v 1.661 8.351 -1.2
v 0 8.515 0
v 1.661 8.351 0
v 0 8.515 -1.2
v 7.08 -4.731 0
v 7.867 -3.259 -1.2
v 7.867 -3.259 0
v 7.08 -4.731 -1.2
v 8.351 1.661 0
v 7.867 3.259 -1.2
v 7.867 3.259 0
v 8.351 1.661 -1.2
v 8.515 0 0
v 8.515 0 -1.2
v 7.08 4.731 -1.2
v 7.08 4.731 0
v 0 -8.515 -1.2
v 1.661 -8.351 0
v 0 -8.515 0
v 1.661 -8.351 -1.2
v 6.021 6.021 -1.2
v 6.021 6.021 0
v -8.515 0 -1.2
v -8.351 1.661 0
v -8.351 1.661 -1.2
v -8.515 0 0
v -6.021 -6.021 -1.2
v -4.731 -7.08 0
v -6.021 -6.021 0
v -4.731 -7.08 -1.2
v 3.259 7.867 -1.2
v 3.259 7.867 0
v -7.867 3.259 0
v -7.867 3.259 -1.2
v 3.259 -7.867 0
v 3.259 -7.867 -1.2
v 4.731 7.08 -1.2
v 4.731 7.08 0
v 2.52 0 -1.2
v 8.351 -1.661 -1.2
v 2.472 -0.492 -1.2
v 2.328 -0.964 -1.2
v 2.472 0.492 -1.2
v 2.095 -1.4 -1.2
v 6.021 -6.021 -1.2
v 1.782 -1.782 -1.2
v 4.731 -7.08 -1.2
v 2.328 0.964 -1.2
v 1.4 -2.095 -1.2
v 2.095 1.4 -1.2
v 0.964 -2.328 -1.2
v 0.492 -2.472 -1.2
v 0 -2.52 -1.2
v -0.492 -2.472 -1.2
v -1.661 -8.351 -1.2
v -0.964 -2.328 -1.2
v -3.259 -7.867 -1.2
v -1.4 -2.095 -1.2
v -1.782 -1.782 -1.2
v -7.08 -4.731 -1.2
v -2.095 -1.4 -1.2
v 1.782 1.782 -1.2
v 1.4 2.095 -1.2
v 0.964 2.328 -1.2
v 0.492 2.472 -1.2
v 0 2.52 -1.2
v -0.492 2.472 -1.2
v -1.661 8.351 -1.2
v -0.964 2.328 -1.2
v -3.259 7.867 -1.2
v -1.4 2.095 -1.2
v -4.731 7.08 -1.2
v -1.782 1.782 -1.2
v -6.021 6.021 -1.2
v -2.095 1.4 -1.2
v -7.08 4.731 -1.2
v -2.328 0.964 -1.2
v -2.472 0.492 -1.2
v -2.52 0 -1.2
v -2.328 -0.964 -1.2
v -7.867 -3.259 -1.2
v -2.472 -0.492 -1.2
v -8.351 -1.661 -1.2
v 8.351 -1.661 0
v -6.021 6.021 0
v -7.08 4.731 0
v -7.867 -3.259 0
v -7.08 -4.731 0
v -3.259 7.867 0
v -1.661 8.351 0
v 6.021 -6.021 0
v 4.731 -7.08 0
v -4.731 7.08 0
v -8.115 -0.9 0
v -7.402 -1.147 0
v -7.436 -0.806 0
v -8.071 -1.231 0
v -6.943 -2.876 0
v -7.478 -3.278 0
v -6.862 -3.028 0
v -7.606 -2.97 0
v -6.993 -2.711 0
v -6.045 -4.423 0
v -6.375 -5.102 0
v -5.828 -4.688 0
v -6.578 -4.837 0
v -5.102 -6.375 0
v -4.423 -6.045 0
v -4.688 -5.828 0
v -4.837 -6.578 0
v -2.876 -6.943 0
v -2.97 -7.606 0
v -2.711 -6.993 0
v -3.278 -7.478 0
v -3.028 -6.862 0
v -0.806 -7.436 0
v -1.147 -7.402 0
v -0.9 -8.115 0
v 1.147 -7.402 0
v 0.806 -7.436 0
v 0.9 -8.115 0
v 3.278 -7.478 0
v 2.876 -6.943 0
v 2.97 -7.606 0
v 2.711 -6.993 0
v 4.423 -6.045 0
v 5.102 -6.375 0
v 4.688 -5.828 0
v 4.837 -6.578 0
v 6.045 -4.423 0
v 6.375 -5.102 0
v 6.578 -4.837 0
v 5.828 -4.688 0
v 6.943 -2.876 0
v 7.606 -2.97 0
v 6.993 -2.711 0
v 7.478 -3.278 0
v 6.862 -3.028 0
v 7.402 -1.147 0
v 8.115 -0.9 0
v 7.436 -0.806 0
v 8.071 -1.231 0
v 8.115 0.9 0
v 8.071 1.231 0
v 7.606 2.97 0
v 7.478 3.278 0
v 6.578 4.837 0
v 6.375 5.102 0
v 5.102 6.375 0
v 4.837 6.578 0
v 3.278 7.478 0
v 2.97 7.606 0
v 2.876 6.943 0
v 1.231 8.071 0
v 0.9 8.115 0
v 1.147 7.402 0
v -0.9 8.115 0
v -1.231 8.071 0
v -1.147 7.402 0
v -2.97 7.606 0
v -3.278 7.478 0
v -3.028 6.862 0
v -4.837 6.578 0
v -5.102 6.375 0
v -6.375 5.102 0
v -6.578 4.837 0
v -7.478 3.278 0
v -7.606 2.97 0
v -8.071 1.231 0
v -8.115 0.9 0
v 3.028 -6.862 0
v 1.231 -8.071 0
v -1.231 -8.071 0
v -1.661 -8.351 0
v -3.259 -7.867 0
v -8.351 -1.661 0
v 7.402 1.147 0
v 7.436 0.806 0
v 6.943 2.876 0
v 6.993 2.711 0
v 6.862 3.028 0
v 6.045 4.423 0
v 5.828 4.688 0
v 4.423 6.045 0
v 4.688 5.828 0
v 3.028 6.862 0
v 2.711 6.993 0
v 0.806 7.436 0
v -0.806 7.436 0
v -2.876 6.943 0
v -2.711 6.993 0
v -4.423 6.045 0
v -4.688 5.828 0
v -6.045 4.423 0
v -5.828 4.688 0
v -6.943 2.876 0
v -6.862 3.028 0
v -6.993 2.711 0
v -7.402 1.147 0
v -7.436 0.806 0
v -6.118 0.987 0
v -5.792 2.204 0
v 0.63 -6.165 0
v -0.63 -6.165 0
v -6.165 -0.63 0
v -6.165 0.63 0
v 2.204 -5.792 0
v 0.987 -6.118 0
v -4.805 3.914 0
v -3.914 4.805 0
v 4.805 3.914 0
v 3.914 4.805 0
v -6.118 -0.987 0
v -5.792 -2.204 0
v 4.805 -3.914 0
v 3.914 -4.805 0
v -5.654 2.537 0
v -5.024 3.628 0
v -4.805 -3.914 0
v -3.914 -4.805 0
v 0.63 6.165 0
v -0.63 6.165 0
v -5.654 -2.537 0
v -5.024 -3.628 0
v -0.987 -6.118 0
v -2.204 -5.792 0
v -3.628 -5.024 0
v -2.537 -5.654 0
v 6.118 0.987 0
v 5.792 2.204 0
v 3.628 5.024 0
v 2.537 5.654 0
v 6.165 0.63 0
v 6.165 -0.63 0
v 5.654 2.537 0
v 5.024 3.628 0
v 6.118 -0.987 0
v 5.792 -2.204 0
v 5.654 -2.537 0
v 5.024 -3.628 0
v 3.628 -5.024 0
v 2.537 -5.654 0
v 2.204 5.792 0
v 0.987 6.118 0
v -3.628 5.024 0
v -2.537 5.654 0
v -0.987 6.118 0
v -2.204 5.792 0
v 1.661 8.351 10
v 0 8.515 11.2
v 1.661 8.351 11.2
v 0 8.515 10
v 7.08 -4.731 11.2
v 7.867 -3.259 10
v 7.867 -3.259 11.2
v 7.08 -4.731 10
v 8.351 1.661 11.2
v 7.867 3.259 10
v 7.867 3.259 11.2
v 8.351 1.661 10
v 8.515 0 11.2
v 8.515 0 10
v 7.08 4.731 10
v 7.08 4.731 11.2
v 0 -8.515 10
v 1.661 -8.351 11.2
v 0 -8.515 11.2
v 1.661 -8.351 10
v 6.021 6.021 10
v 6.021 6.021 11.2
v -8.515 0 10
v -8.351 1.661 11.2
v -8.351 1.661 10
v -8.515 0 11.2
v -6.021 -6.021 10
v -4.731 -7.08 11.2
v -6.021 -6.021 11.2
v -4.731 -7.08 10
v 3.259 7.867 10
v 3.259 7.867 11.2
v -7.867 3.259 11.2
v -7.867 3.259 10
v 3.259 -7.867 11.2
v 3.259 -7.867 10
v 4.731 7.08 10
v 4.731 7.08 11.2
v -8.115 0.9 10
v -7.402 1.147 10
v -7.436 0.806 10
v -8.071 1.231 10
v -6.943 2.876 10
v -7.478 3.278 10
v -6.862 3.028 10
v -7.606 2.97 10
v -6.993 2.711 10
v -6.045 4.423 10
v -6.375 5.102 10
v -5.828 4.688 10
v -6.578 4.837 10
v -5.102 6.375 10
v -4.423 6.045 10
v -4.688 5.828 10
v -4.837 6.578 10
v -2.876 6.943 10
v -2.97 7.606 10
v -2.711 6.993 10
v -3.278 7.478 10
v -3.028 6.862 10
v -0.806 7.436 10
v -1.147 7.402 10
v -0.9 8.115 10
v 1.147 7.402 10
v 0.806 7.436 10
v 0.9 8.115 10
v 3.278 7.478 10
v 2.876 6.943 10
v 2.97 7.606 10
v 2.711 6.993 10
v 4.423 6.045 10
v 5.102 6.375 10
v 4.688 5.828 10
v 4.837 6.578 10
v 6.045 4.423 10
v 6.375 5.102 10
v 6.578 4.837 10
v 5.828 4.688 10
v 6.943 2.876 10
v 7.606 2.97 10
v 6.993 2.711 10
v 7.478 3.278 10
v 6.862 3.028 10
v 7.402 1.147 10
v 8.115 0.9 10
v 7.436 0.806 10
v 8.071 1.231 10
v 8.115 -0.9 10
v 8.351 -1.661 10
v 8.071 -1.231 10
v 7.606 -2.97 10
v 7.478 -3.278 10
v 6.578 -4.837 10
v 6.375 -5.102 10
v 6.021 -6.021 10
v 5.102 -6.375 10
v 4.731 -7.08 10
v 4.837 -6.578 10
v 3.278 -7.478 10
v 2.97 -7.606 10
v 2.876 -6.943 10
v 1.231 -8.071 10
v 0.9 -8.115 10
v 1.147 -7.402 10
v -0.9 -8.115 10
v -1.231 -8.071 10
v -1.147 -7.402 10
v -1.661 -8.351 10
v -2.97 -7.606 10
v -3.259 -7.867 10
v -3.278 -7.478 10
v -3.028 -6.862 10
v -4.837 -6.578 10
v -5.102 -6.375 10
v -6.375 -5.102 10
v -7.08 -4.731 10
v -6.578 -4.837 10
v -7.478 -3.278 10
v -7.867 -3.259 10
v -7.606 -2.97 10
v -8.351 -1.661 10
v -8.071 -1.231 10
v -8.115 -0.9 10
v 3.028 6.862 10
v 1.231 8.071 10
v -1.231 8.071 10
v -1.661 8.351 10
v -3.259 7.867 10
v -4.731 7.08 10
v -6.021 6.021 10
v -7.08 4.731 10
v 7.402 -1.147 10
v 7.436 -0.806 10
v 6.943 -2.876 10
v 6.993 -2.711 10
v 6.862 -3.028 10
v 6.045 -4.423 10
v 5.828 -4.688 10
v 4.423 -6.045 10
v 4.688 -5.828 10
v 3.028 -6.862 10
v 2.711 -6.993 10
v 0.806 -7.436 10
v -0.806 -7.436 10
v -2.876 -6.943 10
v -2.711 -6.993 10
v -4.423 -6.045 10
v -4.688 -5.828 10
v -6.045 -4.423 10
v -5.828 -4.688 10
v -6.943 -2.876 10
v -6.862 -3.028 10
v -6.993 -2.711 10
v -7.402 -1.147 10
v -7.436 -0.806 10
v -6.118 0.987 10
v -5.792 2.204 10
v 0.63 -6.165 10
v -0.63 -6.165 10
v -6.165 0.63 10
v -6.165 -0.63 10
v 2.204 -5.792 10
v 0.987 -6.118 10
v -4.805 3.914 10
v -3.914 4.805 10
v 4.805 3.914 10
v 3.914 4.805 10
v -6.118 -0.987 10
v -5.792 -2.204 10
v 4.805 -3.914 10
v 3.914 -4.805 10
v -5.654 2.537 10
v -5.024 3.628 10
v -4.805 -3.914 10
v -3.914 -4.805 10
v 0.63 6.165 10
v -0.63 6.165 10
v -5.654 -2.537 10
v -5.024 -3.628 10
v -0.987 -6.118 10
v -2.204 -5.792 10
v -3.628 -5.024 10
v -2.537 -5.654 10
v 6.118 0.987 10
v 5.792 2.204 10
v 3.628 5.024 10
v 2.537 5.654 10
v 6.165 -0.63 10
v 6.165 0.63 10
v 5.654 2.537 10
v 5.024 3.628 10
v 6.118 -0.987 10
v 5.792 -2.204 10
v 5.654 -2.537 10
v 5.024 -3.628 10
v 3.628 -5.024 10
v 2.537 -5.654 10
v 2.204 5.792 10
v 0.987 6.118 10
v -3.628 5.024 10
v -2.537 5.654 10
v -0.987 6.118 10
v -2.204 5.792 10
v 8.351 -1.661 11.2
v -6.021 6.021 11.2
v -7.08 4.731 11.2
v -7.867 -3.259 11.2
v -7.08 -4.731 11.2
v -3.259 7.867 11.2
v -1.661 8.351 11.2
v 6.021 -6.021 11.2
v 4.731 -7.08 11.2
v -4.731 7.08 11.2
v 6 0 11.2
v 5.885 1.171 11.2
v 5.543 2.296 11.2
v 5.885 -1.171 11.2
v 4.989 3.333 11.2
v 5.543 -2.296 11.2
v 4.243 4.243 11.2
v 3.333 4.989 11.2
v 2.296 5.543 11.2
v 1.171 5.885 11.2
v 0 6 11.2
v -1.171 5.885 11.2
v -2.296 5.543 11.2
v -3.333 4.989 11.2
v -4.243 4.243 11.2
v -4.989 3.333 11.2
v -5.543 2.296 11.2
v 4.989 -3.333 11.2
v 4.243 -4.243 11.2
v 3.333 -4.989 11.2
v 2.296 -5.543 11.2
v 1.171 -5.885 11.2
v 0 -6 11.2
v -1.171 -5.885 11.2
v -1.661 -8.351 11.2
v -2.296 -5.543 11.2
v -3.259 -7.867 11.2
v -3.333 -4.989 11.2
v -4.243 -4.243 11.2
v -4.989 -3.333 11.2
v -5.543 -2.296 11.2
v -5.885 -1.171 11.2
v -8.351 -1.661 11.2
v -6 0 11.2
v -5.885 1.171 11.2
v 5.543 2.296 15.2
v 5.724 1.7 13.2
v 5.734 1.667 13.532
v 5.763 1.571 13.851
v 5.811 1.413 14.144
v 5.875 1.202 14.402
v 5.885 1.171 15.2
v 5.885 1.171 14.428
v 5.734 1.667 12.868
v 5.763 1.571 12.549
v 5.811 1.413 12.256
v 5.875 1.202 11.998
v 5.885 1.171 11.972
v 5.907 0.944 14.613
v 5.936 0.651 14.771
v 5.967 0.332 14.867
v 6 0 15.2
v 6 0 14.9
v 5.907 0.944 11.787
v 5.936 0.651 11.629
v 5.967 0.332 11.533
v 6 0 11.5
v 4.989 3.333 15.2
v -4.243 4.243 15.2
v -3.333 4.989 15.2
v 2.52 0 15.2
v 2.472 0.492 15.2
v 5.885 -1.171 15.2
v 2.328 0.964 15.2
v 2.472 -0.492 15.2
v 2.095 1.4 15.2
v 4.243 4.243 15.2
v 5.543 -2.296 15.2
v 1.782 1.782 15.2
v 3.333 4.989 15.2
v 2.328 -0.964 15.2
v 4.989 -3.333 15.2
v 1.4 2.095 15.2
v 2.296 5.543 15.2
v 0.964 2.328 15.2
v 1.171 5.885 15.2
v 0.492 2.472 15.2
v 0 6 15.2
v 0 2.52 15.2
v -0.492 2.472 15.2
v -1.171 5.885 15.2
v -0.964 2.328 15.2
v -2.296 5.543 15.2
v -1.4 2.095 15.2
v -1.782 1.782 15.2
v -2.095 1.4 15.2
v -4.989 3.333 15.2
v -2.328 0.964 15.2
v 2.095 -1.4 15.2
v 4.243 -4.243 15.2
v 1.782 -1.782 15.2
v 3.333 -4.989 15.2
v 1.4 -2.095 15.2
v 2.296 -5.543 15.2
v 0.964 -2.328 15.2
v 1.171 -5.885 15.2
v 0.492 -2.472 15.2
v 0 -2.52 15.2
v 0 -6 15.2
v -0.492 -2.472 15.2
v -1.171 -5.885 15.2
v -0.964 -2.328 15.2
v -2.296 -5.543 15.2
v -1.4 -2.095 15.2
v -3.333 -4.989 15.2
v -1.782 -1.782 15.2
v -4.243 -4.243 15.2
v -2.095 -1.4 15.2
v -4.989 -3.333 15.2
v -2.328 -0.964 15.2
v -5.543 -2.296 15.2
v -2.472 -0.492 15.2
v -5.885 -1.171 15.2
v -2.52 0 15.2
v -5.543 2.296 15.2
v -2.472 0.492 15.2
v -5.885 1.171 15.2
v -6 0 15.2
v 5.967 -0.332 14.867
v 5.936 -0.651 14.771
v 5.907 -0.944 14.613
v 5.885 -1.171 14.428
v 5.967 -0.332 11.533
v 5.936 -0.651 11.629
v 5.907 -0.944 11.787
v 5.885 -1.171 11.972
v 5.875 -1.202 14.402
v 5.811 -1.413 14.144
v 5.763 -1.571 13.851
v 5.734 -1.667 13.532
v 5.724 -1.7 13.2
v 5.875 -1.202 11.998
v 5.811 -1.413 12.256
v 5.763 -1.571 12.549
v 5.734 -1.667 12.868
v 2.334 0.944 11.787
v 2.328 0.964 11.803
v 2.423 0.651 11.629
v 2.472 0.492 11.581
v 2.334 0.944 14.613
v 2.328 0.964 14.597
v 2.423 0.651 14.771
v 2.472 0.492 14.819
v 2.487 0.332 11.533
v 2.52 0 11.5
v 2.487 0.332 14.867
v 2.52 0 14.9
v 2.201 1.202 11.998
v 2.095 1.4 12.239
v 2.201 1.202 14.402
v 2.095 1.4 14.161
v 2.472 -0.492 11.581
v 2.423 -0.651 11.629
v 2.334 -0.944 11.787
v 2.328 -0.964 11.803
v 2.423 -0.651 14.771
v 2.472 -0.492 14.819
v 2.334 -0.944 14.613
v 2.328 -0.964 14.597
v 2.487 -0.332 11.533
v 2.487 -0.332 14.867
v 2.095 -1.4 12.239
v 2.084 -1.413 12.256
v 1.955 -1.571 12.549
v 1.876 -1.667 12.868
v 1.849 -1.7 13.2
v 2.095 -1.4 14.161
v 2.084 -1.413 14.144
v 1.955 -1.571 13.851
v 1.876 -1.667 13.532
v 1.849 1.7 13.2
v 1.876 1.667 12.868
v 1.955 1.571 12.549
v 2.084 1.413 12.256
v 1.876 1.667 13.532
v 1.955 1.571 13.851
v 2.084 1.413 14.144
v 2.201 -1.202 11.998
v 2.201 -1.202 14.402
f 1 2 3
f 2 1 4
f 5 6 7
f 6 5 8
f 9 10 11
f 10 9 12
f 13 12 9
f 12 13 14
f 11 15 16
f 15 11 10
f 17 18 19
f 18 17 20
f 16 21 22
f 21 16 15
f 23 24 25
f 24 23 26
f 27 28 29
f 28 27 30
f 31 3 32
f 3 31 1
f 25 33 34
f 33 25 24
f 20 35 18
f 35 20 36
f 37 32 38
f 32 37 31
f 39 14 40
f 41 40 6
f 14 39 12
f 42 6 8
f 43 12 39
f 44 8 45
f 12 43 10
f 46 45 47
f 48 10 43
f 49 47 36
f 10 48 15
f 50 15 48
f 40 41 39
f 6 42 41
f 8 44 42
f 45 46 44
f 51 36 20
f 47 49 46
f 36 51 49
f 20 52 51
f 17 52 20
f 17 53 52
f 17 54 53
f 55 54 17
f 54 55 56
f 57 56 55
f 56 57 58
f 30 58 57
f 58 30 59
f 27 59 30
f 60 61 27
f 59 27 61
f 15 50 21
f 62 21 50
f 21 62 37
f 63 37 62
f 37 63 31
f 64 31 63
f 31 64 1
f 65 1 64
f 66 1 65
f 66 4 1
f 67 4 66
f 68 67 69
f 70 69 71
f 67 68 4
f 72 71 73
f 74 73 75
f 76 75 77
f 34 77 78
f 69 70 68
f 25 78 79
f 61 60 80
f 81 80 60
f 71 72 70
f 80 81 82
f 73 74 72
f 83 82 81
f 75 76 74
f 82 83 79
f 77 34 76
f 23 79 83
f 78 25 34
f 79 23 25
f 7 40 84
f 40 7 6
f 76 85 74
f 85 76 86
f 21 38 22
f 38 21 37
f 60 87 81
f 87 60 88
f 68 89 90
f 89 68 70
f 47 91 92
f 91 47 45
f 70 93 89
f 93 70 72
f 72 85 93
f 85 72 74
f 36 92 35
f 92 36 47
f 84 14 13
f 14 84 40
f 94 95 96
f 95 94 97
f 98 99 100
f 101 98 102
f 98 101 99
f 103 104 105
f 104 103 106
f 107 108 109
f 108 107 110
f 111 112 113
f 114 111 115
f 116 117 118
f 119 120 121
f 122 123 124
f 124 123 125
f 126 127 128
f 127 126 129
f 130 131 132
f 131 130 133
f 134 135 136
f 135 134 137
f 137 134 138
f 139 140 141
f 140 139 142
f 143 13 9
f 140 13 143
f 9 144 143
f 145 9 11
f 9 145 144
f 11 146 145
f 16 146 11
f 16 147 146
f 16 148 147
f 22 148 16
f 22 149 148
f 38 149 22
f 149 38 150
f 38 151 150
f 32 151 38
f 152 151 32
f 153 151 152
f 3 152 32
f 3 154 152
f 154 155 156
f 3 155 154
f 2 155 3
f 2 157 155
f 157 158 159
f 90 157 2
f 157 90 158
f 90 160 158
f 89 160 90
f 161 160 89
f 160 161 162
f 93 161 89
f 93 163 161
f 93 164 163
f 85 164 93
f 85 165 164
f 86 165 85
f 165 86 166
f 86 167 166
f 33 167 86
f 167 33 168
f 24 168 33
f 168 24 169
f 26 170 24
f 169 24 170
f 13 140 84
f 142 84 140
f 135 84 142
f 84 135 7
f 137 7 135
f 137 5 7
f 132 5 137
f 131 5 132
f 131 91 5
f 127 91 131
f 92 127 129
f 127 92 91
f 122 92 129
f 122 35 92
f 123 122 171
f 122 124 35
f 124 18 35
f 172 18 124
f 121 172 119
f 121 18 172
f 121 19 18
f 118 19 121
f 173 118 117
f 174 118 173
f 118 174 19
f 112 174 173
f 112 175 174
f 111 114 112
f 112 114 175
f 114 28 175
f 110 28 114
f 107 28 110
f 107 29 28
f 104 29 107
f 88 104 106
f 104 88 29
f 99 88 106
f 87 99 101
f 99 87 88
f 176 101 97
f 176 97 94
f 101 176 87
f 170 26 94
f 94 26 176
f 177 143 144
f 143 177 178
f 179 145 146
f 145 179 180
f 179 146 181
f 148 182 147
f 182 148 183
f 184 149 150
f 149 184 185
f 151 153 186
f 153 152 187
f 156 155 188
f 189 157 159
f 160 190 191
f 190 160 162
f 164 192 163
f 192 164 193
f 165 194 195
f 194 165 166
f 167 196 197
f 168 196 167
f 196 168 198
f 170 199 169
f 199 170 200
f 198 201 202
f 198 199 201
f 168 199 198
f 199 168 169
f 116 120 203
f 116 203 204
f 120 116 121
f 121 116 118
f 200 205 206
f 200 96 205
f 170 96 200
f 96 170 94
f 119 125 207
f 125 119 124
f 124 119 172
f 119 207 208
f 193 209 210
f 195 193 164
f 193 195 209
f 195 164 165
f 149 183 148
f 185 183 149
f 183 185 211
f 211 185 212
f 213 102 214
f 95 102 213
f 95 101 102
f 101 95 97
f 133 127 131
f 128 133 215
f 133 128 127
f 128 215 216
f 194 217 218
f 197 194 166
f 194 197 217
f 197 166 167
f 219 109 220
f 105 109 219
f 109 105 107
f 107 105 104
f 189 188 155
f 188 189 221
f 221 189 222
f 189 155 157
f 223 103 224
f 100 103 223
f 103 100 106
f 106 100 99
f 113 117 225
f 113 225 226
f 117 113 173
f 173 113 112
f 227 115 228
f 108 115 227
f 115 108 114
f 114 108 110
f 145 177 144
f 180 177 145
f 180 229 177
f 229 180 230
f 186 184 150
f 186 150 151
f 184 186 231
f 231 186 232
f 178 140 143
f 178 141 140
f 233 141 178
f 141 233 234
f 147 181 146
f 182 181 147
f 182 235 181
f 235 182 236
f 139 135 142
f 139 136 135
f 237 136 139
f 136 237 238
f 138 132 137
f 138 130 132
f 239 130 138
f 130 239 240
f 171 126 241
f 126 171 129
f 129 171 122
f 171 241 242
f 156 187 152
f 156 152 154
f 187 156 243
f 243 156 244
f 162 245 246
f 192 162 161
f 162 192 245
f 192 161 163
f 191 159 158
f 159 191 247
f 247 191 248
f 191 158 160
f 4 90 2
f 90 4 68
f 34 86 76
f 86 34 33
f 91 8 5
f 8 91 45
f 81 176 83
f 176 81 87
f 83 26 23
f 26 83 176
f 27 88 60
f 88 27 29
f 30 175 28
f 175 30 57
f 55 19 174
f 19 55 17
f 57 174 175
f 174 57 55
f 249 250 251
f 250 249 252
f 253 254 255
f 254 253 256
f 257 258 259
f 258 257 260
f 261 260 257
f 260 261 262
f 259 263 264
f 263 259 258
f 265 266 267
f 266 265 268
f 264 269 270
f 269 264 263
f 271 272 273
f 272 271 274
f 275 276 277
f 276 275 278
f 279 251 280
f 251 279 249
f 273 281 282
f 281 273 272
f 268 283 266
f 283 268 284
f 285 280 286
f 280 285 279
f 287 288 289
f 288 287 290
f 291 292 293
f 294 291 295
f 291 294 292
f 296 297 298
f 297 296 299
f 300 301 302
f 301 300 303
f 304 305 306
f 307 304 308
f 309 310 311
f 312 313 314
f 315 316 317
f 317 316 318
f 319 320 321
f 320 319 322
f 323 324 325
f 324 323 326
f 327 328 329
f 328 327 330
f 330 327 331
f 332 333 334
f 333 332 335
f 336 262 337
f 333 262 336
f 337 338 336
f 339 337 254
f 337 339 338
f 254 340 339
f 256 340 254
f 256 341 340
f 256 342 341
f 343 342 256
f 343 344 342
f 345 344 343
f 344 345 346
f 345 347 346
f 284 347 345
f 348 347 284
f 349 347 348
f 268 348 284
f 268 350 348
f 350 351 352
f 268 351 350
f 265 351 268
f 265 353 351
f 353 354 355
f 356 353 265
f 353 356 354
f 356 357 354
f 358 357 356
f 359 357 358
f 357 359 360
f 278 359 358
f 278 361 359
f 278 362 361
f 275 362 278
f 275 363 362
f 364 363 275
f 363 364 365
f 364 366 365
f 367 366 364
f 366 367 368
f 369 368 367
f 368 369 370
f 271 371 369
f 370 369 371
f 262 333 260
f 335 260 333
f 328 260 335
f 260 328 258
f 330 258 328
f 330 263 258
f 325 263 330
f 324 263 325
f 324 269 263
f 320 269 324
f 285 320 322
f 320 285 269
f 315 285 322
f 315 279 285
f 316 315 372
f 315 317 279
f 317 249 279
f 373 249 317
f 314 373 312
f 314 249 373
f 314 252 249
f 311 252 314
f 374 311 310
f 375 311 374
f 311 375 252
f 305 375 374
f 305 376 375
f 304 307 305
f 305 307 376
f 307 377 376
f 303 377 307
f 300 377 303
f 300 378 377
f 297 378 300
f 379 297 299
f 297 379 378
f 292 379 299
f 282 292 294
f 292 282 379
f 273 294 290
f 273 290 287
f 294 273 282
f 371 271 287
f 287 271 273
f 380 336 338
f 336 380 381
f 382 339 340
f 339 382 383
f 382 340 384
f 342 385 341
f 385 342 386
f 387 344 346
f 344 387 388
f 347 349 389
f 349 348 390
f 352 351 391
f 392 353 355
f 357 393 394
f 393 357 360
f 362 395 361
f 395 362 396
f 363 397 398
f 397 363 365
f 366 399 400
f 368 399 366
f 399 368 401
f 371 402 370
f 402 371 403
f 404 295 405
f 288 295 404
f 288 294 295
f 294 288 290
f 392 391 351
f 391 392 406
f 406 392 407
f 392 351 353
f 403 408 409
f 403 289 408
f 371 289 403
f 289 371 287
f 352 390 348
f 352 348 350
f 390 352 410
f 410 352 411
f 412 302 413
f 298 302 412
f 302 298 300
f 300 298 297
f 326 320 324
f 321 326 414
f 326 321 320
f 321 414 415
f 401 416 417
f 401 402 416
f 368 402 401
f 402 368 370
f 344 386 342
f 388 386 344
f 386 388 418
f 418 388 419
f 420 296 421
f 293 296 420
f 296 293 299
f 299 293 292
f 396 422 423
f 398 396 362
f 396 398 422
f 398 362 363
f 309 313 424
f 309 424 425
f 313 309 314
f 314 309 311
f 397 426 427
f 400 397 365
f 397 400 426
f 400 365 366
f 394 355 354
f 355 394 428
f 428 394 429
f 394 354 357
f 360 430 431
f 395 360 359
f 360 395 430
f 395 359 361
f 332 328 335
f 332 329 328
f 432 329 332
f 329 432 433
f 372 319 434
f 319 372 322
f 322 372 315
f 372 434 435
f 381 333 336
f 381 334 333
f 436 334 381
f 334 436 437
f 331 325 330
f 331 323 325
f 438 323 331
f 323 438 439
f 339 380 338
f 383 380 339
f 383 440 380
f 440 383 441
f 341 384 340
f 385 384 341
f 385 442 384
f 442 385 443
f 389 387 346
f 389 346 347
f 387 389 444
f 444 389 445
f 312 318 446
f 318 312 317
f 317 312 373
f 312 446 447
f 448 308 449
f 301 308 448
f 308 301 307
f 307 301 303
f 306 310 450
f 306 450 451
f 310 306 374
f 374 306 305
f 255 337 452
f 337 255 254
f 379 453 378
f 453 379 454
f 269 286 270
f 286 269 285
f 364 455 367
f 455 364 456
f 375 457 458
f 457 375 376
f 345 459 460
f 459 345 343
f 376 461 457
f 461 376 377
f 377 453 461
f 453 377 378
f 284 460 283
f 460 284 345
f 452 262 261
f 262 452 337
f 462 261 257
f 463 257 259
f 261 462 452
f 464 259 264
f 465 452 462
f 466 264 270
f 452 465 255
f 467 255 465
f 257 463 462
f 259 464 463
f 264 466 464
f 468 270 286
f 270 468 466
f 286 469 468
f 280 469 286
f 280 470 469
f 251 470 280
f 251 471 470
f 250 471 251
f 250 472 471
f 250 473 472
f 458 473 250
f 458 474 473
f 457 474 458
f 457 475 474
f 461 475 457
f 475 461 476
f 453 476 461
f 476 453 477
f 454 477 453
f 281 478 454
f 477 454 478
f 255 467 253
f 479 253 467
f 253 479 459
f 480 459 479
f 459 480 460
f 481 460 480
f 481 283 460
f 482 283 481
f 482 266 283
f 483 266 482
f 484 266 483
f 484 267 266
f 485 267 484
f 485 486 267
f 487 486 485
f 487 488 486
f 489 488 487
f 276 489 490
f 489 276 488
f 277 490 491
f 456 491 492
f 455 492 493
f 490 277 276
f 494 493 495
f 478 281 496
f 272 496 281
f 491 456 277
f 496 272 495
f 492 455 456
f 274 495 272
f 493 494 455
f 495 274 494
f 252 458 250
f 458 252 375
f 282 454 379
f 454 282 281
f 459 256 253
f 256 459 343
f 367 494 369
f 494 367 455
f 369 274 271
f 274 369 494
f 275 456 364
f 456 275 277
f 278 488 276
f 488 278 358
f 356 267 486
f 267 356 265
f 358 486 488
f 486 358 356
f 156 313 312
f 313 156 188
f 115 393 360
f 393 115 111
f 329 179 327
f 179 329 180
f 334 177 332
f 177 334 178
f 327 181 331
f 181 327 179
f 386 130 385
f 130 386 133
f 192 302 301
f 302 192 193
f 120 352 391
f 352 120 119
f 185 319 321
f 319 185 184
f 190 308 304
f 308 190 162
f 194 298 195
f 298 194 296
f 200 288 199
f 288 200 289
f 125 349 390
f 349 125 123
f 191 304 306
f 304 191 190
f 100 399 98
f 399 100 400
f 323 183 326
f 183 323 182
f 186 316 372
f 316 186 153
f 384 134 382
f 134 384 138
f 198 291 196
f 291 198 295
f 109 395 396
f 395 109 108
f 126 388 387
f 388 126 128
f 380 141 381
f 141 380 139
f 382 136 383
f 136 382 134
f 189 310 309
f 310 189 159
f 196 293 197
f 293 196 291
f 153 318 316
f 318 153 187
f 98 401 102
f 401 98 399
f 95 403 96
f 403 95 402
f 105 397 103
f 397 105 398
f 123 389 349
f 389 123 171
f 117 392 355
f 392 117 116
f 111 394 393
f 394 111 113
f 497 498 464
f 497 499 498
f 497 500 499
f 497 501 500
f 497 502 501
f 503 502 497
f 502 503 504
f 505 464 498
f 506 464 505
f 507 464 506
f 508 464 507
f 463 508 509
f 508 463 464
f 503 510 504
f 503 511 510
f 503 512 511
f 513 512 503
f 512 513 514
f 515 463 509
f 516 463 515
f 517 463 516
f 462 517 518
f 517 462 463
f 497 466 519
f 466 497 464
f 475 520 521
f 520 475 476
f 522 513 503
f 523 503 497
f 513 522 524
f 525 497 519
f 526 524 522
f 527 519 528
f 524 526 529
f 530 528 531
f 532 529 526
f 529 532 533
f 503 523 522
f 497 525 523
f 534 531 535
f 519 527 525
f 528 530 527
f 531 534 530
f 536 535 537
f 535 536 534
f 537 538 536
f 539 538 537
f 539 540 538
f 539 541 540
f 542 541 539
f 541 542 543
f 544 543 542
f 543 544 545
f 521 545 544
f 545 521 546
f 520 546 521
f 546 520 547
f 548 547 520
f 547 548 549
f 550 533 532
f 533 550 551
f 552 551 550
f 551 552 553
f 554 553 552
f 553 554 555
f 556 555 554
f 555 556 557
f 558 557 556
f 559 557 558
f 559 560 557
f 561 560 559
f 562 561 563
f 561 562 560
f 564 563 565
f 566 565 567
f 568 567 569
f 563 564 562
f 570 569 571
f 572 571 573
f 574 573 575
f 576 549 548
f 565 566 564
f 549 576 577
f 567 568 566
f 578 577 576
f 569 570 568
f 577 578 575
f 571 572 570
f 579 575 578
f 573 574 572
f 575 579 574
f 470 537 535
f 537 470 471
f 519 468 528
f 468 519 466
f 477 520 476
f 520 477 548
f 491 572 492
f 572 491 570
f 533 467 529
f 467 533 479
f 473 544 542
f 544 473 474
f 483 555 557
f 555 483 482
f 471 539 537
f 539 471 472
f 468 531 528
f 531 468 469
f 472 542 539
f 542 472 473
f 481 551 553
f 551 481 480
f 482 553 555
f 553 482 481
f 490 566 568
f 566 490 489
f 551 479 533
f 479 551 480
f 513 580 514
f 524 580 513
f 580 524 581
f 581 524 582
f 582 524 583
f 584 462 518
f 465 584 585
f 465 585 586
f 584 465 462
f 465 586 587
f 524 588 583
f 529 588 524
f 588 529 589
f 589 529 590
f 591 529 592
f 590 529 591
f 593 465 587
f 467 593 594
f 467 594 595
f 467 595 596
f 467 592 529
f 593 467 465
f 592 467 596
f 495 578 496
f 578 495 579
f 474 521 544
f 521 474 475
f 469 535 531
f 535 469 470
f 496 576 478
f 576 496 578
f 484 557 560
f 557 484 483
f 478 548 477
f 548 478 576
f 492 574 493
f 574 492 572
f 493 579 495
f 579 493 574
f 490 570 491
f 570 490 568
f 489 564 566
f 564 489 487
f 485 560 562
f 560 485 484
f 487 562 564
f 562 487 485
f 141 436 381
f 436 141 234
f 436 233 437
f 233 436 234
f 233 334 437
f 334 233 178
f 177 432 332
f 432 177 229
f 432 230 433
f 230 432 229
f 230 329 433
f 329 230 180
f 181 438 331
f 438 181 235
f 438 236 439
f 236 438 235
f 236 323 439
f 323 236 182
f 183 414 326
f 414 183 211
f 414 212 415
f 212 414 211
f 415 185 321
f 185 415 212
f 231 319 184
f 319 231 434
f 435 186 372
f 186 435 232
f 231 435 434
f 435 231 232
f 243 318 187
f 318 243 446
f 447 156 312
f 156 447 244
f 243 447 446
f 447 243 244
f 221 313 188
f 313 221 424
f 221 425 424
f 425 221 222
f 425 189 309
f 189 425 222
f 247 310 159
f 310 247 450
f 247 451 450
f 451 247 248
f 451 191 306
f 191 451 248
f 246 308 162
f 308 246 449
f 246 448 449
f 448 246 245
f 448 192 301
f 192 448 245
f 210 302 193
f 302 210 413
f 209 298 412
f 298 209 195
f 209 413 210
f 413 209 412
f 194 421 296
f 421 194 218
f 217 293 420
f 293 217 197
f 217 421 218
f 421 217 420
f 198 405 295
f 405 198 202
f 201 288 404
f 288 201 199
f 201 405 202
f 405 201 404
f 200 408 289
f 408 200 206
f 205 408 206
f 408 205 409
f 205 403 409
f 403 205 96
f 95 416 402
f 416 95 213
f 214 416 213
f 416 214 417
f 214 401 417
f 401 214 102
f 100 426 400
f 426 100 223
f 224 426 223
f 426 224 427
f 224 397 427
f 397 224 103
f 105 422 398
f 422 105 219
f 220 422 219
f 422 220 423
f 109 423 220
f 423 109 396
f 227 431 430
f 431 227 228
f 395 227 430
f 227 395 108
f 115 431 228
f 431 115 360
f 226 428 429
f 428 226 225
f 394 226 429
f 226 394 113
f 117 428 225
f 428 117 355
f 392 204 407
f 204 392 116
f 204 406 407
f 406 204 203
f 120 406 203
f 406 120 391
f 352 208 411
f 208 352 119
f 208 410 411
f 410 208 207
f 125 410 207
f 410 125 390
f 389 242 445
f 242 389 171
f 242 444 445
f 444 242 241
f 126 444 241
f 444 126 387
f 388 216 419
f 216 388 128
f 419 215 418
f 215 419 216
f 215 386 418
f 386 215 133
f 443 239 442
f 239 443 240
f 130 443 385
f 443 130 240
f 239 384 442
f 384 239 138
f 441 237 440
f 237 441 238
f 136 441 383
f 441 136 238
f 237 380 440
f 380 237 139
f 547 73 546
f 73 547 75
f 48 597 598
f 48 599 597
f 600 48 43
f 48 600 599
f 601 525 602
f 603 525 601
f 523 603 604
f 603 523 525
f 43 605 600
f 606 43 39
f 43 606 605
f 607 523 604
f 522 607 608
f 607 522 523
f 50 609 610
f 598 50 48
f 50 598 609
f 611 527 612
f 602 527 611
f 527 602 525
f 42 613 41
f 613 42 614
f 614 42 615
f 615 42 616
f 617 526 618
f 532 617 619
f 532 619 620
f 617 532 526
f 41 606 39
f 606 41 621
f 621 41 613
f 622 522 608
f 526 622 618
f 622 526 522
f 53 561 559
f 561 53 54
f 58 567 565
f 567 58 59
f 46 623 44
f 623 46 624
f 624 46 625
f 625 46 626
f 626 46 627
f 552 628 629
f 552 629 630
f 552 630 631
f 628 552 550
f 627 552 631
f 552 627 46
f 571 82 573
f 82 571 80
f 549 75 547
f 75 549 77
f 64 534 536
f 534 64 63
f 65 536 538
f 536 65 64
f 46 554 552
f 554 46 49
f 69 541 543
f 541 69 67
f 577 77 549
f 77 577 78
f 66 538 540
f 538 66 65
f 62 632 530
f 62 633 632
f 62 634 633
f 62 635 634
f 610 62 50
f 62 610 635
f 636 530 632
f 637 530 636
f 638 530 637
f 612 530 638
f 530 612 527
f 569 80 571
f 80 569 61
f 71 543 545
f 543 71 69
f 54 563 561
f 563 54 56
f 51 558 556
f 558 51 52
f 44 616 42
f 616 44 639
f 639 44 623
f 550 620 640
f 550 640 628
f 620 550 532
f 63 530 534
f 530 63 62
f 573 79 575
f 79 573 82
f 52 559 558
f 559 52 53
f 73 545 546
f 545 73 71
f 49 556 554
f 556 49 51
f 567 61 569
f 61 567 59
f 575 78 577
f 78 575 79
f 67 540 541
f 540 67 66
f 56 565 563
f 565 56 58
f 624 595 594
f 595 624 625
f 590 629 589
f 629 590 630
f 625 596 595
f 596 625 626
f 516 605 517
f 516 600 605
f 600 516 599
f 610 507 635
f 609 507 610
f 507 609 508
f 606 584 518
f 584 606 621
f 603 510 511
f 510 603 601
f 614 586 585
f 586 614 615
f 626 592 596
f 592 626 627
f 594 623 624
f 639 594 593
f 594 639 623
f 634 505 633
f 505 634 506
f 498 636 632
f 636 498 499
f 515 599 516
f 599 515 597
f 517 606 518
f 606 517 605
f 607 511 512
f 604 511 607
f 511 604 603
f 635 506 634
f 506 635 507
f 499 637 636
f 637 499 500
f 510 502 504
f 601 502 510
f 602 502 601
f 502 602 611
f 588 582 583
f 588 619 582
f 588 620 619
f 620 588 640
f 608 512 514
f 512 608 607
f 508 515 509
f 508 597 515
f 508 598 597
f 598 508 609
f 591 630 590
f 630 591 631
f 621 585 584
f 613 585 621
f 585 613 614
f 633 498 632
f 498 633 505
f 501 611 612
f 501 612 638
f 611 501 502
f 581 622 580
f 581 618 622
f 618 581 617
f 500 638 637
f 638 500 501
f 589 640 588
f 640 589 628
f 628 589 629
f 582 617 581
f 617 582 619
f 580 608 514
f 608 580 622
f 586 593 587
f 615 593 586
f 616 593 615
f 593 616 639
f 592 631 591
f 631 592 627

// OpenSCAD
$fn = 32;

// ----------------------------------------------------------------------
// Timing pulley: GT2 24T, pitch 2 mm, 17.03 mm x 16.4 mm
// ----------------------------------------------------------------------

// --- parameters (mm) ---
pitch = 2;                // belt pitch
teeth = 24;               // number of grooves
belt_w = 10;              // belt width between the flanges
tip_d = 15.03;            // tip circle diameter
root_d = 13.53;           // groove bottom diameter
groove_h = 0.75;          // groove depth
tooth_w = 1.5;            // groove width at the tip circle
flange_d = 17.03;         // flange diameter
flange_t = 1.2;           // flange thickness
spigot_d = 11.93;         // flange spigot, sunk into the rim
spigot_h = 1.2;           // spigot depth into the rim
bore_d = 5.04;            // shaft bore
hub_d = 12;               // hub diameter
hub_h = 4;                // hub above the flange
bottom_z = -1.2;          // lowest point of the pulley
top_z = 15.2;             // highest point of the pulley
set_d = 3.4;              // set screw tap hole

module rim() {
  cylinder(h = belt_w, d = tip_d);
}

module groove_cutter() {
  /* belt tooth groove: deeper than wide, cut through the belt width */
  translate([root_d / 2, 0, 0])
    linear_extrude(height = belt_w)
      polygon(points = [[-0.6, -tooth_w * 0.42], [groove_h + 0.6, -tooth_w * 0.6],
                        [groove_h + 0.6, tooth_w * 0.6], [-0.6, tooth_w * 0.42]]);
}

module flanges() {
  translate([0, 0, -flange_t]) cylinder(h = flange_t, d = flange_d);
  translate([0, 0, belt_w]) cylinder(h = flange_t, d = flange_d);
  translate([0, 0, -spigot_h]) cylinder(h = spigot_h + 0.6, d = spigot_d);
  translate([0, 0, belt_w - 0.6]) cylinder(h = spigot_h + 0.6, d = spigot_d);
}

module hub() {
  translate([0, 0, bottom_z]) cylinder(h = top_z - bottom_z, d = hub_d);
}

difference() {
  union() {
    rim();
    hub();
    flanges();
  }
  for (i = [0 : teeth - 1]) rotate([0, 0, i * 360 / teeth]) groove_cutter();
  translate([0, 0, bottom_z - 1]) cylinder(h = top_z - bottom_z + 2, d = bore_d);
  translate([-1, 0, top_z - hub_h * 0.5]) rotate([0, 90, 0]) cylinder(h = hub_d / 2 + 3, d = set_d);
}
